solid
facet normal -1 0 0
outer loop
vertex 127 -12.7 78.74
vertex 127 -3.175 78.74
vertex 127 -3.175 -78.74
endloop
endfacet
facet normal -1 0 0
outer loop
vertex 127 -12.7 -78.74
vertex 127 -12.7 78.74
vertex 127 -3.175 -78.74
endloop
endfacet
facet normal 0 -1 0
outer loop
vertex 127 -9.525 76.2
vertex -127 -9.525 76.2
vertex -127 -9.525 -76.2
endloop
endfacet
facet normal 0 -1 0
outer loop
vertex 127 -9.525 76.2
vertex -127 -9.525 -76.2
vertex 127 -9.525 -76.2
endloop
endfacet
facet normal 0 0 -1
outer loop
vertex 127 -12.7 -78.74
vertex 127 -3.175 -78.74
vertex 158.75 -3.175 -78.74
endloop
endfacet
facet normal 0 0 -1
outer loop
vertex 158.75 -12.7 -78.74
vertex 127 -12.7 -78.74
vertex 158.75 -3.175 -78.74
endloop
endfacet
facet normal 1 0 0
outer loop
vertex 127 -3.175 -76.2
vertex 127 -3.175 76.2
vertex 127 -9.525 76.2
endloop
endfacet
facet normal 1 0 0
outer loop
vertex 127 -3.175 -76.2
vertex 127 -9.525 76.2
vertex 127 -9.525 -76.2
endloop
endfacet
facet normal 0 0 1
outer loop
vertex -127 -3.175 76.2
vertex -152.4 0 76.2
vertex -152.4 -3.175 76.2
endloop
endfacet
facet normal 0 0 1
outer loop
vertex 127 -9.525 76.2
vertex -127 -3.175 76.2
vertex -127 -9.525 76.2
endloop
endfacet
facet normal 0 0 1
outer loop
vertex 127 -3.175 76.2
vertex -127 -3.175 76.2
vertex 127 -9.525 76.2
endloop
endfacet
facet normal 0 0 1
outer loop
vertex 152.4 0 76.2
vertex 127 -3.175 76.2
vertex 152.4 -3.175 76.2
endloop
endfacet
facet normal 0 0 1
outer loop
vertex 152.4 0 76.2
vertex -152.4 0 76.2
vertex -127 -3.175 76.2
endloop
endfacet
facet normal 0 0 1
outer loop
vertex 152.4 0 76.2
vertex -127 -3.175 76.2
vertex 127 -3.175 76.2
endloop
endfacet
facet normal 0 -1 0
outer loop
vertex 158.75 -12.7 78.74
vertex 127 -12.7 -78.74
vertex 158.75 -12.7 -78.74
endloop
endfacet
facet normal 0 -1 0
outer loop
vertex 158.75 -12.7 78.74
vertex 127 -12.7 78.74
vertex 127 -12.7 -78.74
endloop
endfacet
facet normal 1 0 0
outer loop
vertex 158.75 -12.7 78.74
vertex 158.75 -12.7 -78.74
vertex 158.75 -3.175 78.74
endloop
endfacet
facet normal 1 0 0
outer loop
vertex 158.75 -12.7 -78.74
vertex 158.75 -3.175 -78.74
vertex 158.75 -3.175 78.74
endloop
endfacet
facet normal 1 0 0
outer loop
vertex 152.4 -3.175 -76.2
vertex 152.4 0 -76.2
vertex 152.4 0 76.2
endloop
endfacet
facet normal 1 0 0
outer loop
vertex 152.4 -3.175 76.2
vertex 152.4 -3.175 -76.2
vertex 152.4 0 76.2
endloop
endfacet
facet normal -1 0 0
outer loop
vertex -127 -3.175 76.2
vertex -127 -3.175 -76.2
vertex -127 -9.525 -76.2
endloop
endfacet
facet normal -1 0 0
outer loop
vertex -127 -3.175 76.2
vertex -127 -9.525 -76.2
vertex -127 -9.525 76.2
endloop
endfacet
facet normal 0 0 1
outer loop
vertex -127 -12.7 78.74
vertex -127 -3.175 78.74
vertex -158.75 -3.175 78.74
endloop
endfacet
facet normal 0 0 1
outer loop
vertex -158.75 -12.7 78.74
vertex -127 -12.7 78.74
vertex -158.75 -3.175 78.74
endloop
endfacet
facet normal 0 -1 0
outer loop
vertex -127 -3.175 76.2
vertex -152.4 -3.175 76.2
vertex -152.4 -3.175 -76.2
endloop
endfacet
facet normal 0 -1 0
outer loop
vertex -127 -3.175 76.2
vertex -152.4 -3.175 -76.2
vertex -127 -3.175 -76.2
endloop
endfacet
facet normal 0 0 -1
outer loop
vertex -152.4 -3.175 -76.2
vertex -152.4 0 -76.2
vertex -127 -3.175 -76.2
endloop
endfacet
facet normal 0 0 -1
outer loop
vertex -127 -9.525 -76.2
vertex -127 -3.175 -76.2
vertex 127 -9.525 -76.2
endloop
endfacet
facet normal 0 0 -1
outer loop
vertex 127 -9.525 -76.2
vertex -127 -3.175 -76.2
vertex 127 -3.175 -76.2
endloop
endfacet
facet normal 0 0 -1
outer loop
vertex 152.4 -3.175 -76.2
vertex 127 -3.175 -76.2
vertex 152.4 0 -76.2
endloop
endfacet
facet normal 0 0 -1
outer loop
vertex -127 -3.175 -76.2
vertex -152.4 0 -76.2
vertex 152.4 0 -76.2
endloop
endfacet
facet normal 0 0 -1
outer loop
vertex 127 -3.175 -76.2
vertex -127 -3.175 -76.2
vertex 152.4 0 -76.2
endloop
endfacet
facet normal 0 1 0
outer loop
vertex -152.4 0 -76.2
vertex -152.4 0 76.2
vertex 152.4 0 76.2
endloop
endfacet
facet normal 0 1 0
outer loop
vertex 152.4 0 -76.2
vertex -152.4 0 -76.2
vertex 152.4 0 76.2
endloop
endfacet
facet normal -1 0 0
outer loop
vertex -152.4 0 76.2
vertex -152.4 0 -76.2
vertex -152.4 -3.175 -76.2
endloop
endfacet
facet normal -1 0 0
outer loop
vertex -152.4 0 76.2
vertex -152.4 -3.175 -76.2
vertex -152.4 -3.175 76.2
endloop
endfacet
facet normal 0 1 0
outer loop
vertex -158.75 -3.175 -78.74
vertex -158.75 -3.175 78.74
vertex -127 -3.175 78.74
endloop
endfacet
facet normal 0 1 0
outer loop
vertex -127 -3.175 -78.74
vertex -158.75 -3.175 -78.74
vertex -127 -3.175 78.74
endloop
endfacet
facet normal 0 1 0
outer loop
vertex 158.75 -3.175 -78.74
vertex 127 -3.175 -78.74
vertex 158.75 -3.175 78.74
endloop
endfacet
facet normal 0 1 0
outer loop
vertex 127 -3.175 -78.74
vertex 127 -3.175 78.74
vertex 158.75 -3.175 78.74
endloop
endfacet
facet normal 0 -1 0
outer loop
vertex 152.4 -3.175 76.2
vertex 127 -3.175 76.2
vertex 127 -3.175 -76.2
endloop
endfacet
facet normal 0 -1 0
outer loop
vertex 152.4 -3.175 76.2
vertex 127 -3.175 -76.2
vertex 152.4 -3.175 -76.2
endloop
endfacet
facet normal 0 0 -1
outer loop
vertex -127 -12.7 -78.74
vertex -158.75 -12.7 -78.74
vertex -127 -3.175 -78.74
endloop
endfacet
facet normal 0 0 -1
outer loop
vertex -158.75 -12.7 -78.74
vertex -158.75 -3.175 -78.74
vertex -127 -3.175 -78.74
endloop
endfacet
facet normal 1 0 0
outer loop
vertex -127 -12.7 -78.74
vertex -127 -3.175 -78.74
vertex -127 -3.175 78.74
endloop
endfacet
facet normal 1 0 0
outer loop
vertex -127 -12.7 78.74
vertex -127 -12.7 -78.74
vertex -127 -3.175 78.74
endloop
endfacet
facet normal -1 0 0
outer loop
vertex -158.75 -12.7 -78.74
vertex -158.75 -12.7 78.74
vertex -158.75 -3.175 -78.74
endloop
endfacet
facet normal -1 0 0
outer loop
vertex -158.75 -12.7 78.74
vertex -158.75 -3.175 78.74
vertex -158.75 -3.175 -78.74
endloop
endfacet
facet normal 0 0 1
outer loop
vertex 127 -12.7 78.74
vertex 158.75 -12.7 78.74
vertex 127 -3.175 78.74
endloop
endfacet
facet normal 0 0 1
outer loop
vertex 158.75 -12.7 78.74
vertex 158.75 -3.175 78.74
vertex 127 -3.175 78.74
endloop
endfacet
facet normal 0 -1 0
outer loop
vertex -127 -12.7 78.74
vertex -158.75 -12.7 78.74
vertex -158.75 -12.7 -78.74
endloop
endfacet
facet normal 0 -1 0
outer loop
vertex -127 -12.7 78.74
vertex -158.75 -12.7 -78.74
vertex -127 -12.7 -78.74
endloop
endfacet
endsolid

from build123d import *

# Parameters (mm, degrees)
F0_W          = 304.8
F0_H          = 152.4
F1_DEPTH      = 9.525
F2_W          = 25.4
F2_H          = 152.4
F3_DEPTH      = 6.35
F3_DEPTH_BACK = 3.175


with BuildPart() as f1:
    # F0 (on Front) → F1 (new body)
    with BuildSketch(Plane.XZ):
        Rectangle(F0_W, F0_H)
    extrude(amount=F1_DEPTH)


with BuildPart() as f3:
    # F2 (on face) → F3 (new body, two sides)
    with BuildSketch(Plane.XZ.offset(9.525)) as f3_sk:
        Polygon((-127, 78.74), (-158.75, 78.74), (-158.75, -78.74), (-127, -78.74), (-127, -76.2), (-152.4, -76.2), (-152.4, 76.2), (-127, 76.2), align=None)
        with Locations((-139.7, 0)):
            Rectangle(F2_W, F2_H)
    extrude(amount=-F3_DEPTH)
    extrude(f3_sk.sketch, amount=F3_DEPTH_BACK)


with BuildPart() as f3b:
    # F2 (on face) → F3, piece 2 (new body, two sides)
    with BuildSketch(Plane.XZ.offset(9.525)) as f3_2_sk:
        with Locations((139.7, 0)):
            Rectangle(F2_W, F2_H)
        Polygon((127, 78.74), (127, 76.2), (152.4, 76.2), (152.4, -76.2), (127, -76.2), (127, -78.74), (158.75, -78.74), (158.75, 78.74), align=None)
    extrude(amount=-F3_DEPTH)
    extrude(f3_2_sk.sketch, amount=F3_DEPTH_BACK)


with BuildPart() as f1_1:
    add(f1.part)

    # F4: cut F3, F3b
    add(f3.part, mode=Mode.SUBTRACT)
    add(f3b.part, mode=Mode.SUBTRACT)


solid = Compound([f3.part, f3b.part, f1_1.part])
